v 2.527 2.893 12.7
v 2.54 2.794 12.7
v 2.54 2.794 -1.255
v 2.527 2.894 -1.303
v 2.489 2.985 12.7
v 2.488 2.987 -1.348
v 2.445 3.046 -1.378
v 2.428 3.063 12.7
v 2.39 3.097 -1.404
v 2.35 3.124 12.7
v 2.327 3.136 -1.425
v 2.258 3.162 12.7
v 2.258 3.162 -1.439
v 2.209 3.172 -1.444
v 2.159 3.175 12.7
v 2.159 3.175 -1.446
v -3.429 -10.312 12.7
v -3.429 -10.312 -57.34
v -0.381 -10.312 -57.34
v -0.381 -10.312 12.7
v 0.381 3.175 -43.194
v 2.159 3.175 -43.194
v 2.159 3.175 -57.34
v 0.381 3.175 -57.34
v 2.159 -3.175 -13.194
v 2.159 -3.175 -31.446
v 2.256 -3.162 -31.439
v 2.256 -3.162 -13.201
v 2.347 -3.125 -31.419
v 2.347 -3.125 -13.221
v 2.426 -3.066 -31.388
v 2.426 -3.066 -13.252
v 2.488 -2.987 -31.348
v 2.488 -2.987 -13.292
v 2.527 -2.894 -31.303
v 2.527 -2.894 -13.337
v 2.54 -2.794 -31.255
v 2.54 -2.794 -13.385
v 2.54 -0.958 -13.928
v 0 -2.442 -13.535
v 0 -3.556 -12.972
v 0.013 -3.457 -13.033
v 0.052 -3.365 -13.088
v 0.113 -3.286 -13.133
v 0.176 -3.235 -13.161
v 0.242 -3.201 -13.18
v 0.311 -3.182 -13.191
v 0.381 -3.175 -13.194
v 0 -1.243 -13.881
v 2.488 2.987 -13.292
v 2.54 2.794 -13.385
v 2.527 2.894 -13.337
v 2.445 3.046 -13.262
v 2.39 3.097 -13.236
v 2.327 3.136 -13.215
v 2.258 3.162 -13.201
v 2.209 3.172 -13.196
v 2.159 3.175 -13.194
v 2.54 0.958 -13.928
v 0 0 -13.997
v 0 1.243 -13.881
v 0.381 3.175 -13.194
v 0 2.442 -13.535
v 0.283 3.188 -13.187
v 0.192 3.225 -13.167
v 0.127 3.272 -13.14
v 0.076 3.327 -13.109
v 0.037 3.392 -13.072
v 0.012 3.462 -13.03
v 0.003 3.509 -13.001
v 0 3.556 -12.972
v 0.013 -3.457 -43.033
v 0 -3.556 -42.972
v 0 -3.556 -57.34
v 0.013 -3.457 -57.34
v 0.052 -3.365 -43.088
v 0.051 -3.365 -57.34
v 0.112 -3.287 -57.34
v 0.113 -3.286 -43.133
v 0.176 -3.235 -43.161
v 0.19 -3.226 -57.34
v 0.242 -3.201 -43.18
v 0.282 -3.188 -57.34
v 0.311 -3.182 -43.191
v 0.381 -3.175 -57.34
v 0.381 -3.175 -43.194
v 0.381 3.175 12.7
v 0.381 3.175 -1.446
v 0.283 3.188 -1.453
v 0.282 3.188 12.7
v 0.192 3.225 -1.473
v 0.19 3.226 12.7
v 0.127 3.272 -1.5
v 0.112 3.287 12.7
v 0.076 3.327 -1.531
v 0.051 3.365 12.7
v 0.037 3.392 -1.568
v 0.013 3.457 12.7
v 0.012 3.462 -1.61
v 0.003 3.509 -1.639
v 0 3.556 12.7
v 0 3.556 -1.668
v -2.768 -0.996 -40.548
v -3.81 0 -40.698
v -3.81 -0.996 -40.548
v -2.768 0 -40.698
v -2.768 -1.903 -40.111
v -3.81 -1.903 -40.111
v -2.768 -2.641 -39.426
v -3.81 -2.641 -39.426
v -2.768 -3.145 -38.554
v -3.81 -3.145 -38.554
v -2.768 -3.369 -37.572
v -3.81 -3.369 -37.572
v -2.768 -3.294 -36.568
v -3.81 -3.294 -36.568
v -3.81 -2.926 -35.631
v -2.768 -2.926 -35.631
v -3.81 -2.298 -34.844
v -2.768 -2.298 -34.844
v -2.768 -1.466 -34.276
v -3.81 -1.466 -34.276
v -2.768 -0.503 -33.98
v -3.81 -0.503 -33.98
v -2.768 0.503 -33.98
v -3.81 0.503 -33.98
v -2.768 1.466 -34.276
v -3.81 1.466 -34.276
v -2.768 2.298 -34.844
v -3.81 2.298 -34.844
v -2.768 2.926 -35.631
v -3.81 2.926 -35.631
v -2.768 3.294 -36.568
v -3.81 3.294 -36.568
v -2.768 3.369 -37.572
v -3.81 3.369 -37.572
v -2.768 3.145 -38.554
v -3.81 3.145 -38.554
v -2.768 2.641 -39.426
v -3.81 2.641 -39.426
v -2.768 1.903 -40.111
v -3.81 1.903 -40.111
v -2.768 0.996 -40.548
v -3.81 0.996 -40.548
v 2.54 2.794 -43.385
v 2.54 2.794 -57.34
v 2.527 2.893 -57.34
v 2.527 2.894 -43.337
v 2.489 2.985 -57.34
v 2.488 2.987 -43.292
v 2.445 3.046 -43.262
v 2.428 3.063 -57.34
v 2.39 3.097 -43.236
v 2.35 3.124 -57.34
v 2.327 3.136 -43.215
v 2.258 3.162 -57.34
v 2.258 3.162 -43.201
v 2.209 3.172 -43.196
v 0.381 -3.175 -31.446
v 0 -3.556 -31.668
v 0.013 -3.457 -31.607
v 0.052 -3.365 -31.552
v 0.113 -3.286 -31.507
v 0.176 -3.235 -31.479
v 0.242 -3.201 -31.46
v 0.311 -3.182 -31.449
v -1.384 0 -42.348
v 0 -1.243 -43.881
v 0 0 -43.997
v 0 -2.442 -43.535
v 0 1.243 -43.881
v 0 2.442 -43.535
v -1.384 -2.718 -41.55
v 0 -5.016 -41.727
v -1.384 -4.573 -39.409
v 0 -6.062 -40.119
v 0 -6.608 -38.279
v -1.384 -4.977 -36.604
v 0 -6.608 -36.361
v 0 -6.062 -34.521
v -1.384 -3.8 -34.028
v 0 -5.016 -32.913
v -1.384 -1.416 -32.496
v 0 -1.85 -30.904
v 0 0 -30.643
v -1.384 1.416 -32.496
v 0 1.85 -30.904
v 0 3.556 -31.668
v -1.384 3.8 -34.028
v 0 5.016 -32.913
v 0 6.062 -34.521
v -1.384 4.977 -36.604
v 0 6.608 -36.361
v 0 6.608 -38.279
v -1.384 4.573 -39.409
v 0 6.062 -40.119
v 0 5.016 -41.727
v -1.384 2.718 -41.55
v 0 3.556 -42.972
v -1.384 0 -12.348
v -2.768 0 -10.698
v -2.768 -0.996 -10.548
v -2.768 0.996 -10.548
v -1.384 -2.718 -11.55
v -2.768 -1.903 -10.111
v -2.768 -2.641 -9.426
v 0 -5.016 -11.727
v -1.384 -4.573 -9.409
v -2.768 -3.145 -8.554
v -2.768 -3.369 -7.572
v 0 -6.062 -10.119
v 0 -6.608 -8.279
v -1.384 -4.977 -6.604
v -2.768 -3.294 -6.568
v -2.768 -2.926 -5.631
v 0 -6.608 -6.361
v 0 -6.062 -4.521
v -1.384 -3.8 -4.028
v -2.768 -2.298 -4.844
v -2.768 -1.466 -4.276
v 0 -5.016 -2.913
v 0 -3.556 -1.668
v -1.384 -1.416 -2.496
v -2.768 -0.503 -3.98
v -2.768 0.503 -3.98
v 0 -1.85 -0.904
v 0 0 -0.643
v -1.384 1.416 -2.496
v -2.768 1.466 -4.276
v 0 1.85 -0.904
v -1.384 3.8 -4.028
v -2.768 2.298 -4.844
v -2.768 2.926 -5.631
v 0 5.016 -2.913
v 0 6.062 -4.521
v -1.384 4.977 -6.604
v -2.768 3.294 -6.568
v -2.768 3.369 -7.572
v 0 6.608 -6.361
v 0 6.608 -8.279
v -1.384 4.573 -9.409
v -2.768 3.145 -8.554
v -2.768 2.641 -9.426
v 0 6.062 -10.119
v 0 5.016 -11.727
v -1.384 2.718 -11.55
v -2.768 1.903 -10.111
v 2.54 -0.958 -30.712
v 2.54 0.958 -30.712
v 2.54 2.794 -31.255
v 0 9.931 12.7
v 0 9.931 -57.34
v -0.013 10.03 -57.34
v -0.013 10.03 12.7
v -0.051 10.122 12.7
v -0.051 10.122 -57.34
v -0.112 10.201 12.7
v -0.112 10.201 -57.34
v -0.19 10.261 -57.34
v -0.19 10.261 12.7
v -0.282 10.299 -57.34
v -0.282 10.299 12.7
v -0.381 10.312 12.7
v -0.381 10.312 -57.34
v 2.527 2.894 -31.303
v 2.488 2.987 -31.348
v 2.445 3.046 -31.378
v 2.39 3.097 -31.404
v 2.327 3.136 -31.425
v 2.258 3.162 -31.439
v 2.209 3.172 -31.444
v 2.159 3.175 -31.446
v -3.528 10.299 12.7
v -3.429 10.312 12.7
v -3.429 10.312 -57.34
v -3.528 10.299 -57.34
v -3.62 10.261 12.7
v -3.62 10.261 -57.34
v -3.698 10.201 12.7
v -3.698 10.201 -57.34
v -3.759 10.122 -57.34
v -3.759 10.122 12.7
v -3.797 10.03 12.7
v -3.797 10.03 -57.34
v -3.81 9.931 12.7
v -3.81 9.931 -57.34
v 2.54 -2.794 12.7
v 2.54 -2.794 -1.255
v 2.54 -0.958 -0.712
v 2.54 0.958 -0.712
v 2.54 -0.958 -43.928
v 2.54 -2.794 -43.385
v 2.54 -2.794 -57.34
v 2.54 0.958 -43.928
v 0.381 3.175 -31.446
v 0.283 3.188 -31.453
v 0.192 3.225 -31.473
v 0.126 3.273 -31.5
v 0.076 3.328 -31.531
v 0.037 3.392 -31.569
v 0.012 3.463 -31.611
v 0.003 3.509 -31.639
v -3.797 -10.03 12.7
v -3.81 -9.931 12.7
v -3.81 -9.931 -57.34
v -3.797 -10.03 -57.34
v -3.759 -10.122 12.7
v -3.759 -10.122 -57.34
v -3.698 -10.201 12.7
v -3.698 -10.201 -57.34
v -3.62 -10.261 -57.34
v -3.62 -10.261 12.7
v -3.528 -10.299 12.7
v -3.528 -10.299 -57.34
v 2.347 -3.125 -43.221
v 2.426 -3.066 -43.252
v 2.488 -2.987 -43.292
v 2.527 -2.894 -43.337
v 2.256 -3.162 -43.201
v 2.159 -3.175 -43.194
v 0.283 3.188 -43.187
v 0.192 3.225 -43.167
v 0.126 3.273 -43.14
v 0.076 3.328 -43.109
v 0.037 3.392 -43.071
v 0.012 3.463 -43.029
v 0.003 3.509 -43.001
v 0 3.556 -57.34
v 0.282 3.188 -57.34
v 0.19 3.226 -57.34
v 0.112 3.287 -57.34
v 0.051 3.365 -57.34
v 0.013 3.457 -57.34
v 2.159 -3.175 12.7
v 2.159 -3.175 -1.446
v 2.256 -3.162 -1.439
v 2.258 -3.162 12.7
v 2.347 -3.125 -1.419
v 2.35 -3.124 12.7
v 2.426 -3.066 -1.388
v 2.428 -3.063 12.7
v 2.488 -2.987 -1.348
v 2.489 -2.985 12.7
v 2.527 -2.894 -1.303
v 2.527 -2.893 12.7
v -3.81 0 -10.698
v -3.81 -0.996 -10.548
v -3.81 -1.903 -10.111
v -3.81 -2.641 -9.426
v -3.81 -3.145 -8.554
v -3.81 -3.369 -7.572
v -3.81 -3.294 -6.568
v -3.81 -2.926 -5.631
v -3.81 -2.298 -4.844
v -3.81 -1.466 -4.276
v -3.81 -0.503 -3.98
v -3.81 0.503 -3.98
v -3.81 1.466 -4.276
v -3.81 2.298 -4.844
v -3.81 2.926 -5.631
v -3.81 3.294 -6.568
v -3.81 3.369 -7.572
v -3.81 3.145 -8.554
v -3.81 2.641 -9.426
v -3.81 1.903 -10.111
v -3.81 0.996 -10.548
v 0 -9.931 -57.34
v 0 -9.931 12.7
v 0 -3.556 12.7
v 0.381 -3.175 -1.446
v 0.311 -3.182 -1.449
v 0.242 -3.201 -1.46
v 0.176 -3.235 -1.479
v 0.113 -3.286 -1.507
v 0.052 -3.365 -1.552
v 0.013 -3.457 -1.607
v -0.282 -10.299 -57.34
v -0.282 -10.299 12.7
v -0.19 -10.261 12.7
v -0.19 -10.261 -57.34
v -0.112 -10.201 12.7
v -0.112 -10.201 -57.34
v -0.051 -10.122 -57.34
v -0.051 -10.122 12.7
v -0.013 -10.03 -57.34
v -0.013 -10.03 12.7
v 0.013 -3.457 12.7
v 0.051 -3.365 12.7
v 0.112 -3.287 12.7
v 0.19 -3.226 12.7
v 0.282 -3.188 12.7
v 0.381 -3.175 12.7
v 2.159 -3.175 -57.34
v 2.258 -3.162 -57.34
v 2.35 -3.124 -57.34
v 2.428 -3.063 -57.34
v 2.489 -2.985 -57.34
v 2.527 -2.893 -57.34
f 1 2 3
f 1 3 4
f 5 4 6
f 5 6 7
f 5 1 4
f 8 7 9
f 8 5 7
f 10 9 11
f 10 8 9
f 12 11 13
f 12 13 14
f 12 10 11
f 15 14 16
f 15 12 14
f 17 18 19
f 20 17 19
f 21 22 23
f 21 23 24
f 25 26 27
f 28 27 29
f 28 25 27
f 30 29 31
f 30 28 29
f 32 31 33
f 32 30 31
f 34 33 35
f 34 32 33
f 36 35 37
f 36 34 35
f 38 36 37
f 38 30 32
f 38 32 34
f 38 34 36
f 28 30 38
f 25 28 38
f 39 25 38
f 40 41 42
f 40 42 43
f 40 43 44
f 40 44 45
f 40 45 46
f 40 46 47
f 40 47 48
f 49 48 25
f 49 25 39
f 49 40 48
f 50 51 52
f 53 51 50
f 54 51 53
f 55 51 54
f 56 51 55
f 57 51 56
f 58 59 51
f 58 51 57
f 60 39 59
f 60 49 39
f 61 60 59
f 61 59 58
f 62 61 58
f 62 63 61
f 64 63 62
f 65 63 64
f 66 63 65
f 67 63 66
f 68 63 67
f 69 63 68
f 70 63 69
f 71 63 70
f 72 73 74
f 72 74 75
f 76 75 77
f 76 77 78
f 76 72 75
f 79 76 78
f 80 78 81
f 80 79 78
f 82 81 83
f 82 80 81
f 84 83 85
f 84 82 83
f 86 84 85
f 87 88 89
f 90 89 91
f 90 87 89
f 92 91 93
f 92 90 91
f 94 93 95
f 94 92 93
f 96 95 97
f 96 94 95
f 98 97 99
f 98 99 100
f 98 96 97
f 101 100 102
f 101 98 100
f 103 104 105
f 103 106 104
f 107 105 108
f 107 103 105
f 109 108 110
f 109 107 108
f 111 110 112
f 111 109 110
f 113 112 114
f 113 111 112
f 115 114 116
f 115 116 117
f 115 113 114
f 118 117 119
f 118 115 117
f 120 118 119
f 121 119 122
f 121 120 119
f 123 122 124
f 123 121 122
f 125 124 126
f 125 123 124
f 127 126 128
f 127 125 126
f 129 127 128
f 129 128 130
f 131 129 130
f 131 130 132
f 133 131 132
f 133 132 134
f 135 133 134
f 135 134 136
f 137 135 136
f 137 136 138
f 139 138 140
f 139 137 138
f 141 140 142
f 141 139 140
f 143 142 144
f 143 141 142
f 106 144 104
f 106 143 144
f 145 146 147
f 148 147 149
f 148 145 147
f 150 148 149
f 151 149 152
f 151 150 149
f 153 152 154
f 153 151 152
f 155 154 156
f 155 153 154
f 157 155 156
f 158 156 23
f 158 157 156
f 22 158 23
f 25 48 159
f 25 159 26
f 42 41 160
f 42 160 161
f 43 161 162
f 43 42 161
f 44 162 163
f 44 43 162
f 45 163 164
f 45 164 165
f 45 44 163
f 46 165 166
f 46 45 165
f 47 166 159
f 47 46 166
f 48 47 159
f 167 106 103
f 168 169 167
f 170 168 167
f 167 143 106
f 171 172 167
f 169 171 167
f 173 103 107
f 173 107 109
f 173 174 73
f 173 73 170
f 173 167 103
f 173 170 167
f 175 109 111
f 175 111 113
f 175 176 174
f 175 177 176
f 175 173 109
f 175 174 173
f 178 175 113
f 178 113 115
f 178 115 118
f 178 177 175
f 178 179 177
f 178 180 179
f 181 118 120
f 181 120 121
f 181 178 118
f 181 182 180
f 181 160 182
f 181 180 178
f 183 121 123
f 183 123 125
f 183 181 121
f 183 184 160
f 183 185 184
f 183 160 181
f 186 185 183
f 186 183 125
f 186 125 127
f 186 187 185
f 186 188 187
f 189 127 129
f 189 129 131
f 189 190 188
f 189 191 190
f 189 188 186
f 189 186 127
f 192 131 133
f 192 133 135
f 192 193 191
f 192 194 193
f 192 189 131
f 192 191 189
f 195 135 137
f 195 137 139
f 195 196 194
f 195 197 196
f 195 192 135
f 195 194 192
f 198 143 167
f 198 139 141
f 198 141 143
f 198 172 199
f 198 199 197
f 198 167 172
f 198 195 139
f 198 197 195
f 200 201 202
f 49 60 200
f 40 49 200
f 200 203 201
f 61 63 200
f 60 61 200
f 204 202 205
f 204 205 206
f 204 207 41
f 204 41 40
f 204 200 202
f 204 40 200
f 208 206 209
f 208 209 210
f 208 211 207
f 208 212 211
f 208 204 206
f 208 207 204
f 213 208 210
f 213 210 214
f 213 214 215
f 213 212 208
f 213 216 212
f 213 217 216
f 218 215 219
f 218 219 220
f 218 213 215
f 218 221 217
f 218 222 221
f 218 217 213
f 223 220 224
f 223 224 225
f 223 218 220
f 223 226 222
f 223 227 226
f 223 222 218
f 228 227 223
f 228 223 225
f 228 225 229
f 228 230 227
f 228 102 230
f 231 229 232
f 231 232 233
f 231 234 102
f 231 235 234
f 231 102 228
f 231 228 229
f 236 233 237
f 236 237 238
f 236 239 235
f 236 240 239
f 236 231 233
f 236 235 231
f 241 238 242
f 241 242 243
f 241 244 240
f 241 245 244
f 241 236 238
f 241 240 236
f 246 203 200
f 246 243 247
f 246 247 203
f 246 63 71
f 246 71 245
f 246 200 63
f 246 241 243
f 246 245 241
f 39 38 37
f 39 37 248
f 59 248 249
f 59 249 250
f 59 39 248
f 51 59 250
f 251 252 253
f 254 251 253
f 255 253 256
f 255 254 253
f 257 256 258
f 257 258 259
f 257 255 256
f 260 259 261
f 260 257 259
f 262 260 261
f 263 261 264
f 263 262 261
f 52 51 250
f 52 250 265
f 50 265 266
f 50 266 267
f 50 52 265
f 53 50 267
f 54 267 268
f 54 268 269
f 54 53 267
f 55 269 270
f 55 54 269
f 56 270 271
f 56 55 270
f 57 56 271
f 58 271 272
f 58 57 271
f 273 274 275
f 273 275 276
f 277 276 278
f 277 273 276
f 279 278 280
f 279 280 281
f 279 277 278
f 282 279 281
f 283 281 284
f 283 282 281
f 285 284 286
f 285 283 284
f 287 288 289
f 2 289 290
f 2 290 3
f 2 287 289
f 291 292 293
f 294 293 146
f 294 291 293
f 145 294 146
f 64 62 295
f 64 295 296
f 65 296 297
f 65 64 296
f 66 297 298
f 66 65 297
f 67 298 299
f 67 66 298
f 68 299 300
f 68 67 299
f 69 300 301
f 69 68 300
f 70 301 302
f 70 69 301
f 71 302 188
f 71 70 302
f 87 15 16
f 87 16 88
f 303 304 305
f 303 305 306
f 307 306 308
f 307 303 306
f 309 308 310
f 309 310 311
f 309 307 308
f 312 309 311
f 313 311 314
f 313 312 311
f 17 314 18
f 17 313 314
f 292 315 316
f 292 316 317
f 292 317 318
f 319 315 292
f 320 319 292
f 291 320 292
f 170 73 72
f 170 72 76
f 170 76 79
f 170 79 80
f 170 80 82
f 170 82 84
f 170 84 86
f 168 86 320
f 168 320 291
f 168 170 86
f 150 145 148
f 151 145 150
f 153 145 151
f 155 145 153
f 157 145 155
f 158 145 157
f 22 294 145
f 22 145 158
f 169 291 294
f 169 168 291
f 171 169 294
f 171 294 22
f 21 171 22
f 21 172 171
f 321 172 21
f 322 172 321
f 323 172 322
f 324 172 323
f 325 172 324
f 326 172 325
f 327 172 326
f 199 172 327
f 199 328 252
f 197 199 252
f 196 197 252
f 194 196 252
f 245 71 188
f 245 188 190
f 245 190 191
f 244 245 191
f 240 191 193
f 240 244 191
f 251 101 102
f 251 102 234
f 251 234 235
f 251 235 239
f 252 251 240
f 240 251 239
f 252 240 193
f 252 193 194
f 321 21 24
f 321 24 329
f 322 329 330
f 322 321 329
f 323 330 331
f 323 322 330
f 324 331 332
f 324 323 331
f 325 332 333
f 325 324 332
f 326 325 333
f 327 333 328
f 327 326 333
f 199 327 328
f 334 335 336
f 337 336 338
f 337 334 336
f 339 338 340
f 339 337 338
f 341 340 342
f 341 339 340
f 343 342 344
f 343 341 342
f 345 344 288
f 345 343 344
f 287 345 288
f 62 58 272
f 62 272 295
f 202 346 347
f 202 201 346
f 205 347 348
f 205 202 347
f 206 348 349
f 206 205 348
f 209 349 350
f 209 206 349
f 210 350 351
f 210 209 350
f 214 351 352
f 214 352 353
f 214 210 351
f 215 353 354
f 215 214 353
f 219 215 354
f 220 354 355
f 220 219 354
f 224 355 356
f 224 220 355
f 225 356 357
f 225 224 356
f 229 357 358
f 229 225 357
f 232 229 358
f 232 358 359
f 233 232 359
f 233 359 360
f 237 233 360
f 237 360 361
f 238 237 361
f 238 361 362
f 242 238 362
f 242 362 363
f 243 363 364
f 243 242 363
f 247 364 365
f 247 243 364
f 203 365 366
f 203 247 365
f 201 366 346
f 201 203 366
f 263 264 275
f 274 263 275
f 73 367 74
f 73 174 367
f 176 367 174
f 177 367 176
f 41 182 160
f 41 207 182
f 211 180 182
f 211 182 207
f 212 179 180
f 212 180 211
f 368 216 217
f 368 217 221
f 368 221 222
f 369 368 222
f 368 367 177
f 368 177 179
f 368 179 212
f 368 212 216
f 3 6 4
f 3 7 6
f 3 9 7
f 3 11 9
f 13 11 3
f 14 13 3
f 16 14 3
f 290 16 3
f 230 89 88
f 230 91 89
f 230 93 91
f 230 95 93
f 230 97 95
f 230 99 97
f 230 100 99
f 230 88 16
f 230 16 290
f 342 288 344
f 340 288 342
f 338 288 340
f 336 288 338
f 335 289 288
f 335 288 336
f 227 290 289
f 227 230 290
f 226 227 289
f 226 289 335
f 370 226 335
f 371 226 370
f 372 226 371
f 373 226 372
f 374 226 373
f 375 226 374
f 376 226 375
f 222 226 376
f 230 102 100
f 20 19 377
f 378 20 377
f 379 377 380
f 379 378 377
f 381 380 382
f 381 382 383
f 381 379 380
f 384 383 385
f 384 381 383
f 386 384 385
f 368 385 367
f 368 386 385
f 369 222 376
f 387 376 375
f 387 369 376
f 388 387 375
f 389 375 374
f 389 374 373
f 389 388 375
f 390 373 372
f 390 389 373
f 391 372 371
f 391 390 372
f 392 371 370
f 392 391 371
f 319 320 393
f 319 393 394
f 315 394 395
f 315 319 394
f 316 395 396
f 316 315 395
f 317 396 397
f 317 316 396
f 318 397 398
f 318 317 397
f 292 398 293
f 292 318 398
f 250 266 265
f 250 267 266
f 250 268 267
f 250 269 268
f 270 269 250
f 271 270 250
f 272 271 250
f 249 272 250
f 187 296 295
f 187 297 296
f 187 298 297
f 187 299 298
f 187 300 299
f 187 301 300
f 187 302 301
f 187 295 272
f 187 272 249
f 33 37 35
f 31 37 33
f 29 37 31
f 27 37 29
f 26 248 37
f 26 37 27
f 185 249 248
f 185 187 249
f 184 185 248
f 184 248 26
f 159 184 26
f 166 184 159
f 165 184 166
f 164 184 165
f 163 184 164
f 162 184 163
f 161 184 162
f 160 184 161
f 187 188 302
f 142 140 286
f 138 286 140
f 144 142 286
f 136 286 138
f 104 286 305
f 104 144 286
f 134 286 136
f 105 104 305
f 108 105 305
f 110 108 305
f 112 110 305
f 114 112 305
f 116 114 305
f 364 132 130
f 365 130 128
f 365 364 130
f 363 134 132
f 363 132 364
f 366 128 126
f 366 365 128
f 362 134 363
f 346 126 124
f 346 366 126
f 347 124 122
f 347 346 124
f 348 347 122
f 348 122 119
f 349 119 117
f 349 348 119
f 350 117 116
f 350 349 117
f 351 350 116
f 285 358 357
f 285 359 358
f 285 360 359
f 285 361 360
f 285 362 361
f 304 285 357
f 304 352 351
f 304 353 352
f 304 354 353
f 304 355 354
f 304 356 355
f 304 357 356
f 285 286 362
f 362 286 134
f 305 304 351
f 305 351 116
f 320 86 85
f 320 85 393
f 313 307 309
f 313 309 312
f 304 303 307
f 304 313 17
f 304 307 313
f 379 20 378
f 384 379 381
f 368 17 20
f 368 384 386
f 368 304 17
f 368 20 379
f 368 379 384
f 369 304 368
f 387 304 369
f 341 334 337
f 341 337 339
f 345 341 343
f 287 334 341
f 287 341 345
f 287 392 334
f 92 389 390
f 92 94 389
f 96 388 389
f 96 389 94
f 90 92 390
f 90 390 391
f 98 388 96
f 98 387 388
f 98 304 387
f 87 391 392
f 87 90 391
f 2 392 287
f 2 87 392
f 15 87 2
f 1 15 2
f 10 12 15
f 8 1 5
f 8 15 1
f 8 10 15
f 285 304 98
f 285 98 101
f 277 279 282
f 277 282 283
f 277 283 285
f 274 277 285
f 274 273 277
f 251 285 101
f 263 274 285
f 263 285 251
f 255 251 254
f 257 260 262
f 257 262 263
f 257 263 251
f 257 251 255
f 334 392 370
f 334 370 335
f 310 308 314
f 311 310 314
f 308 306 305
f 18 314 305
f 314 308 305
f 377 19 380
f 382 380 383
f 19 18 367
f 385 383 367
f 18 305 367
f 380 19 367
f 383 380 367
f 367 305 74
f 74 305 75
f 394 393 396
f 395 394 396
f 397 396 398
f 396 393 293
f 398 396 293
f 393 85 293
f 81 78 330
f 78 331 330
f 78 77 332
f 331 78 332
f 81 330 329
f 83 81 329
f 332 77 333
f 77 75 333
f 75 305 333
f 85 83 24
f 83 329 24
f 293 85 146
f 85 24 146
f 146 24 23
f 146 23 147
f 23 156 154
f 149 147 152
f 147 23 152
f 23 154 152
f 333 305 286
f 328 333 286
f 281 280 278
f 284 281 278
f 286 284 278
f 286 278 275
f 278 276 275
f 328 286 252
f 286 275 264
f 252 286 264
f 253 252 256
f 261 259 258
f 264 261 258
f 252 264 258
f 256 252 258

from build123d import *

# Parameters (mm, degrees)
BOSS_EXTRUDE1_DEPTH                         = 70.04
CSK_FOR_1_4_FLAT_HEAD_MACHINE_SCREW_2_COUNT = 2
CSK_FOR_1_4_FLAT_HEAD_MACHINE_SCREW_2_PITCH = 30
CUT_EXTRUDE2_REACH                          = 4.54
SKETCH8_R                                   = 6.6772536


with BuildPart() as part:
    # Sketch1 → Boss-Extrude1 (new body)
    with BuildSketch(Plane.XY.offset(12.7)):
        with BuildLine():
            Line((-3.81, 9.9314), (-3.81, -9.9314))
            ThreePointArc((-3.81, -9.9314), (-3.698407684, -10.200807684), (-3.429, -10.3124))
            Line((-3.429, -10.3124), (-0.381, -10.3124))
            ThreePointArc((-0.381, -10.3124), (-0.111592316, -10.200807684), (0, -9.9314))
            Line((0, -9.9314), (0, -3.556))
            ThreePointArc((0, -3.556), (0.111592316, -3.286592316), (0.381, -3.175))
            Line((0.381, -3.175), (2.159, -3.175))
            ThreePointArc((2.159, -3.175), (2.428407684, -3.063407684), (2.54, -2.794))
            Line((2.54, -2.794), (2.54, 2.794))
            ThreePointArc((2.54, 2.794), (2.428407684, 3.063407684), (2.159, 3.175))
            Line((2.159, 3.175), (0.381, 3.175))
            ThreePointArc((0.381, 3.175), (0.111592316, 3.286592316), (0, 3.556))
            Line((0, 3.556), (0, 9.9314))
            ThreePointArc((0, 9.9314), (-0.111592316, 10.200807684), (-0.381, 10.3124))
            Line((-0.381, 10.3124), (-3.429, 10.3124))
            ThreePointArc((-3.429, 10.3124), (-3.698407684, 10.200807684), (-3.81, 9.9314))
        make_face()
    extrude(amount=-BOSS_EXTRUDE1_DEPTH)

    # Sketch7 → CSK for 1/4 Flat Head Machine Screw (100)1 (revolve, cut)
    with BuildSketch(Plane(origin=(0, 0, -37.32), x_dir=(0, 0, -1), z_dir=(0, 1, 0))):
        Polygon((0, 0), (0, 3.81), (3.3782, 3.81), (3.3782, 2.768234659), (6.6772536, 0), align=None)
    csk_for_1_4_flat_head_machine_screw_100 = revolve(axis=Axis((6.35, 0, -37.32), (-1, 0, 0)), mode=Mode.SUBTRACT)

    # CSK for 1_4 Flat Head Machine Screw  2: CSK for 1/4 Flat Head Machine Screw (100)1 ×2
    with Locations(*[(0, 0, i * CSK_FOR_1_4_FLAT_HEAD_MACHINE_SCREW_2_PITCH) for i in range(1, CSK_FOR_1_4_FLAT_HEAD_MACHINE_SCREW_2_COUNT)]):
        add(csk_for_1_4_flat_head_machine_screw_100, mode=Mode.SUBTRACT)

    # Sketch8 → Cut-Extrude2 (cut, up to next)
    with BuildSketch(Plane(origin=(0, 0, 0), x_dir=(0, 0, -1), z_dir=(1, 0, 0)), mode=Mode.PRIVATE) as cut_extrude2_sk1:
        with Locations((7.32, 0)):
            Circle(SKETCH8_R)
    cut_extrude2_tool1 = extrude(cut_extrude2_sk1.sketch, amount=CUT_EXTRUDE2_REACH, mode=Mode.PRIVATE) & part.part
    add(cut_extrude2_tool1.solids().sort_by_distance((0, 0, -7.32))[0], mode=Mode.SUBTRACT)
    # Sketch8 → Cut-Extrude2 (cut, up to next)
    with BuildSketch(Plane(origin=(0, 0, 0), x_dir=(0, 0, -1), z_dir=(1, 0, 0)), mode=Mode.PRIVATE) as cut_extrude2_sk2:
        with Locations((37.32, 0)):
            Circle(SKETCH8_R)
    cut_extrude2_tool2 = extrude(cut_extrude2_sk2.sketch, amount=CUT_EXTRUDE2_REACH, mode=Mode.PRIVATE) & part.part
    add(cut_extrude2_tool2.solids().sort_by_distance((0, 0, -37.32))[0], mode=Mode.SUBTRACT)


solid = part.part
